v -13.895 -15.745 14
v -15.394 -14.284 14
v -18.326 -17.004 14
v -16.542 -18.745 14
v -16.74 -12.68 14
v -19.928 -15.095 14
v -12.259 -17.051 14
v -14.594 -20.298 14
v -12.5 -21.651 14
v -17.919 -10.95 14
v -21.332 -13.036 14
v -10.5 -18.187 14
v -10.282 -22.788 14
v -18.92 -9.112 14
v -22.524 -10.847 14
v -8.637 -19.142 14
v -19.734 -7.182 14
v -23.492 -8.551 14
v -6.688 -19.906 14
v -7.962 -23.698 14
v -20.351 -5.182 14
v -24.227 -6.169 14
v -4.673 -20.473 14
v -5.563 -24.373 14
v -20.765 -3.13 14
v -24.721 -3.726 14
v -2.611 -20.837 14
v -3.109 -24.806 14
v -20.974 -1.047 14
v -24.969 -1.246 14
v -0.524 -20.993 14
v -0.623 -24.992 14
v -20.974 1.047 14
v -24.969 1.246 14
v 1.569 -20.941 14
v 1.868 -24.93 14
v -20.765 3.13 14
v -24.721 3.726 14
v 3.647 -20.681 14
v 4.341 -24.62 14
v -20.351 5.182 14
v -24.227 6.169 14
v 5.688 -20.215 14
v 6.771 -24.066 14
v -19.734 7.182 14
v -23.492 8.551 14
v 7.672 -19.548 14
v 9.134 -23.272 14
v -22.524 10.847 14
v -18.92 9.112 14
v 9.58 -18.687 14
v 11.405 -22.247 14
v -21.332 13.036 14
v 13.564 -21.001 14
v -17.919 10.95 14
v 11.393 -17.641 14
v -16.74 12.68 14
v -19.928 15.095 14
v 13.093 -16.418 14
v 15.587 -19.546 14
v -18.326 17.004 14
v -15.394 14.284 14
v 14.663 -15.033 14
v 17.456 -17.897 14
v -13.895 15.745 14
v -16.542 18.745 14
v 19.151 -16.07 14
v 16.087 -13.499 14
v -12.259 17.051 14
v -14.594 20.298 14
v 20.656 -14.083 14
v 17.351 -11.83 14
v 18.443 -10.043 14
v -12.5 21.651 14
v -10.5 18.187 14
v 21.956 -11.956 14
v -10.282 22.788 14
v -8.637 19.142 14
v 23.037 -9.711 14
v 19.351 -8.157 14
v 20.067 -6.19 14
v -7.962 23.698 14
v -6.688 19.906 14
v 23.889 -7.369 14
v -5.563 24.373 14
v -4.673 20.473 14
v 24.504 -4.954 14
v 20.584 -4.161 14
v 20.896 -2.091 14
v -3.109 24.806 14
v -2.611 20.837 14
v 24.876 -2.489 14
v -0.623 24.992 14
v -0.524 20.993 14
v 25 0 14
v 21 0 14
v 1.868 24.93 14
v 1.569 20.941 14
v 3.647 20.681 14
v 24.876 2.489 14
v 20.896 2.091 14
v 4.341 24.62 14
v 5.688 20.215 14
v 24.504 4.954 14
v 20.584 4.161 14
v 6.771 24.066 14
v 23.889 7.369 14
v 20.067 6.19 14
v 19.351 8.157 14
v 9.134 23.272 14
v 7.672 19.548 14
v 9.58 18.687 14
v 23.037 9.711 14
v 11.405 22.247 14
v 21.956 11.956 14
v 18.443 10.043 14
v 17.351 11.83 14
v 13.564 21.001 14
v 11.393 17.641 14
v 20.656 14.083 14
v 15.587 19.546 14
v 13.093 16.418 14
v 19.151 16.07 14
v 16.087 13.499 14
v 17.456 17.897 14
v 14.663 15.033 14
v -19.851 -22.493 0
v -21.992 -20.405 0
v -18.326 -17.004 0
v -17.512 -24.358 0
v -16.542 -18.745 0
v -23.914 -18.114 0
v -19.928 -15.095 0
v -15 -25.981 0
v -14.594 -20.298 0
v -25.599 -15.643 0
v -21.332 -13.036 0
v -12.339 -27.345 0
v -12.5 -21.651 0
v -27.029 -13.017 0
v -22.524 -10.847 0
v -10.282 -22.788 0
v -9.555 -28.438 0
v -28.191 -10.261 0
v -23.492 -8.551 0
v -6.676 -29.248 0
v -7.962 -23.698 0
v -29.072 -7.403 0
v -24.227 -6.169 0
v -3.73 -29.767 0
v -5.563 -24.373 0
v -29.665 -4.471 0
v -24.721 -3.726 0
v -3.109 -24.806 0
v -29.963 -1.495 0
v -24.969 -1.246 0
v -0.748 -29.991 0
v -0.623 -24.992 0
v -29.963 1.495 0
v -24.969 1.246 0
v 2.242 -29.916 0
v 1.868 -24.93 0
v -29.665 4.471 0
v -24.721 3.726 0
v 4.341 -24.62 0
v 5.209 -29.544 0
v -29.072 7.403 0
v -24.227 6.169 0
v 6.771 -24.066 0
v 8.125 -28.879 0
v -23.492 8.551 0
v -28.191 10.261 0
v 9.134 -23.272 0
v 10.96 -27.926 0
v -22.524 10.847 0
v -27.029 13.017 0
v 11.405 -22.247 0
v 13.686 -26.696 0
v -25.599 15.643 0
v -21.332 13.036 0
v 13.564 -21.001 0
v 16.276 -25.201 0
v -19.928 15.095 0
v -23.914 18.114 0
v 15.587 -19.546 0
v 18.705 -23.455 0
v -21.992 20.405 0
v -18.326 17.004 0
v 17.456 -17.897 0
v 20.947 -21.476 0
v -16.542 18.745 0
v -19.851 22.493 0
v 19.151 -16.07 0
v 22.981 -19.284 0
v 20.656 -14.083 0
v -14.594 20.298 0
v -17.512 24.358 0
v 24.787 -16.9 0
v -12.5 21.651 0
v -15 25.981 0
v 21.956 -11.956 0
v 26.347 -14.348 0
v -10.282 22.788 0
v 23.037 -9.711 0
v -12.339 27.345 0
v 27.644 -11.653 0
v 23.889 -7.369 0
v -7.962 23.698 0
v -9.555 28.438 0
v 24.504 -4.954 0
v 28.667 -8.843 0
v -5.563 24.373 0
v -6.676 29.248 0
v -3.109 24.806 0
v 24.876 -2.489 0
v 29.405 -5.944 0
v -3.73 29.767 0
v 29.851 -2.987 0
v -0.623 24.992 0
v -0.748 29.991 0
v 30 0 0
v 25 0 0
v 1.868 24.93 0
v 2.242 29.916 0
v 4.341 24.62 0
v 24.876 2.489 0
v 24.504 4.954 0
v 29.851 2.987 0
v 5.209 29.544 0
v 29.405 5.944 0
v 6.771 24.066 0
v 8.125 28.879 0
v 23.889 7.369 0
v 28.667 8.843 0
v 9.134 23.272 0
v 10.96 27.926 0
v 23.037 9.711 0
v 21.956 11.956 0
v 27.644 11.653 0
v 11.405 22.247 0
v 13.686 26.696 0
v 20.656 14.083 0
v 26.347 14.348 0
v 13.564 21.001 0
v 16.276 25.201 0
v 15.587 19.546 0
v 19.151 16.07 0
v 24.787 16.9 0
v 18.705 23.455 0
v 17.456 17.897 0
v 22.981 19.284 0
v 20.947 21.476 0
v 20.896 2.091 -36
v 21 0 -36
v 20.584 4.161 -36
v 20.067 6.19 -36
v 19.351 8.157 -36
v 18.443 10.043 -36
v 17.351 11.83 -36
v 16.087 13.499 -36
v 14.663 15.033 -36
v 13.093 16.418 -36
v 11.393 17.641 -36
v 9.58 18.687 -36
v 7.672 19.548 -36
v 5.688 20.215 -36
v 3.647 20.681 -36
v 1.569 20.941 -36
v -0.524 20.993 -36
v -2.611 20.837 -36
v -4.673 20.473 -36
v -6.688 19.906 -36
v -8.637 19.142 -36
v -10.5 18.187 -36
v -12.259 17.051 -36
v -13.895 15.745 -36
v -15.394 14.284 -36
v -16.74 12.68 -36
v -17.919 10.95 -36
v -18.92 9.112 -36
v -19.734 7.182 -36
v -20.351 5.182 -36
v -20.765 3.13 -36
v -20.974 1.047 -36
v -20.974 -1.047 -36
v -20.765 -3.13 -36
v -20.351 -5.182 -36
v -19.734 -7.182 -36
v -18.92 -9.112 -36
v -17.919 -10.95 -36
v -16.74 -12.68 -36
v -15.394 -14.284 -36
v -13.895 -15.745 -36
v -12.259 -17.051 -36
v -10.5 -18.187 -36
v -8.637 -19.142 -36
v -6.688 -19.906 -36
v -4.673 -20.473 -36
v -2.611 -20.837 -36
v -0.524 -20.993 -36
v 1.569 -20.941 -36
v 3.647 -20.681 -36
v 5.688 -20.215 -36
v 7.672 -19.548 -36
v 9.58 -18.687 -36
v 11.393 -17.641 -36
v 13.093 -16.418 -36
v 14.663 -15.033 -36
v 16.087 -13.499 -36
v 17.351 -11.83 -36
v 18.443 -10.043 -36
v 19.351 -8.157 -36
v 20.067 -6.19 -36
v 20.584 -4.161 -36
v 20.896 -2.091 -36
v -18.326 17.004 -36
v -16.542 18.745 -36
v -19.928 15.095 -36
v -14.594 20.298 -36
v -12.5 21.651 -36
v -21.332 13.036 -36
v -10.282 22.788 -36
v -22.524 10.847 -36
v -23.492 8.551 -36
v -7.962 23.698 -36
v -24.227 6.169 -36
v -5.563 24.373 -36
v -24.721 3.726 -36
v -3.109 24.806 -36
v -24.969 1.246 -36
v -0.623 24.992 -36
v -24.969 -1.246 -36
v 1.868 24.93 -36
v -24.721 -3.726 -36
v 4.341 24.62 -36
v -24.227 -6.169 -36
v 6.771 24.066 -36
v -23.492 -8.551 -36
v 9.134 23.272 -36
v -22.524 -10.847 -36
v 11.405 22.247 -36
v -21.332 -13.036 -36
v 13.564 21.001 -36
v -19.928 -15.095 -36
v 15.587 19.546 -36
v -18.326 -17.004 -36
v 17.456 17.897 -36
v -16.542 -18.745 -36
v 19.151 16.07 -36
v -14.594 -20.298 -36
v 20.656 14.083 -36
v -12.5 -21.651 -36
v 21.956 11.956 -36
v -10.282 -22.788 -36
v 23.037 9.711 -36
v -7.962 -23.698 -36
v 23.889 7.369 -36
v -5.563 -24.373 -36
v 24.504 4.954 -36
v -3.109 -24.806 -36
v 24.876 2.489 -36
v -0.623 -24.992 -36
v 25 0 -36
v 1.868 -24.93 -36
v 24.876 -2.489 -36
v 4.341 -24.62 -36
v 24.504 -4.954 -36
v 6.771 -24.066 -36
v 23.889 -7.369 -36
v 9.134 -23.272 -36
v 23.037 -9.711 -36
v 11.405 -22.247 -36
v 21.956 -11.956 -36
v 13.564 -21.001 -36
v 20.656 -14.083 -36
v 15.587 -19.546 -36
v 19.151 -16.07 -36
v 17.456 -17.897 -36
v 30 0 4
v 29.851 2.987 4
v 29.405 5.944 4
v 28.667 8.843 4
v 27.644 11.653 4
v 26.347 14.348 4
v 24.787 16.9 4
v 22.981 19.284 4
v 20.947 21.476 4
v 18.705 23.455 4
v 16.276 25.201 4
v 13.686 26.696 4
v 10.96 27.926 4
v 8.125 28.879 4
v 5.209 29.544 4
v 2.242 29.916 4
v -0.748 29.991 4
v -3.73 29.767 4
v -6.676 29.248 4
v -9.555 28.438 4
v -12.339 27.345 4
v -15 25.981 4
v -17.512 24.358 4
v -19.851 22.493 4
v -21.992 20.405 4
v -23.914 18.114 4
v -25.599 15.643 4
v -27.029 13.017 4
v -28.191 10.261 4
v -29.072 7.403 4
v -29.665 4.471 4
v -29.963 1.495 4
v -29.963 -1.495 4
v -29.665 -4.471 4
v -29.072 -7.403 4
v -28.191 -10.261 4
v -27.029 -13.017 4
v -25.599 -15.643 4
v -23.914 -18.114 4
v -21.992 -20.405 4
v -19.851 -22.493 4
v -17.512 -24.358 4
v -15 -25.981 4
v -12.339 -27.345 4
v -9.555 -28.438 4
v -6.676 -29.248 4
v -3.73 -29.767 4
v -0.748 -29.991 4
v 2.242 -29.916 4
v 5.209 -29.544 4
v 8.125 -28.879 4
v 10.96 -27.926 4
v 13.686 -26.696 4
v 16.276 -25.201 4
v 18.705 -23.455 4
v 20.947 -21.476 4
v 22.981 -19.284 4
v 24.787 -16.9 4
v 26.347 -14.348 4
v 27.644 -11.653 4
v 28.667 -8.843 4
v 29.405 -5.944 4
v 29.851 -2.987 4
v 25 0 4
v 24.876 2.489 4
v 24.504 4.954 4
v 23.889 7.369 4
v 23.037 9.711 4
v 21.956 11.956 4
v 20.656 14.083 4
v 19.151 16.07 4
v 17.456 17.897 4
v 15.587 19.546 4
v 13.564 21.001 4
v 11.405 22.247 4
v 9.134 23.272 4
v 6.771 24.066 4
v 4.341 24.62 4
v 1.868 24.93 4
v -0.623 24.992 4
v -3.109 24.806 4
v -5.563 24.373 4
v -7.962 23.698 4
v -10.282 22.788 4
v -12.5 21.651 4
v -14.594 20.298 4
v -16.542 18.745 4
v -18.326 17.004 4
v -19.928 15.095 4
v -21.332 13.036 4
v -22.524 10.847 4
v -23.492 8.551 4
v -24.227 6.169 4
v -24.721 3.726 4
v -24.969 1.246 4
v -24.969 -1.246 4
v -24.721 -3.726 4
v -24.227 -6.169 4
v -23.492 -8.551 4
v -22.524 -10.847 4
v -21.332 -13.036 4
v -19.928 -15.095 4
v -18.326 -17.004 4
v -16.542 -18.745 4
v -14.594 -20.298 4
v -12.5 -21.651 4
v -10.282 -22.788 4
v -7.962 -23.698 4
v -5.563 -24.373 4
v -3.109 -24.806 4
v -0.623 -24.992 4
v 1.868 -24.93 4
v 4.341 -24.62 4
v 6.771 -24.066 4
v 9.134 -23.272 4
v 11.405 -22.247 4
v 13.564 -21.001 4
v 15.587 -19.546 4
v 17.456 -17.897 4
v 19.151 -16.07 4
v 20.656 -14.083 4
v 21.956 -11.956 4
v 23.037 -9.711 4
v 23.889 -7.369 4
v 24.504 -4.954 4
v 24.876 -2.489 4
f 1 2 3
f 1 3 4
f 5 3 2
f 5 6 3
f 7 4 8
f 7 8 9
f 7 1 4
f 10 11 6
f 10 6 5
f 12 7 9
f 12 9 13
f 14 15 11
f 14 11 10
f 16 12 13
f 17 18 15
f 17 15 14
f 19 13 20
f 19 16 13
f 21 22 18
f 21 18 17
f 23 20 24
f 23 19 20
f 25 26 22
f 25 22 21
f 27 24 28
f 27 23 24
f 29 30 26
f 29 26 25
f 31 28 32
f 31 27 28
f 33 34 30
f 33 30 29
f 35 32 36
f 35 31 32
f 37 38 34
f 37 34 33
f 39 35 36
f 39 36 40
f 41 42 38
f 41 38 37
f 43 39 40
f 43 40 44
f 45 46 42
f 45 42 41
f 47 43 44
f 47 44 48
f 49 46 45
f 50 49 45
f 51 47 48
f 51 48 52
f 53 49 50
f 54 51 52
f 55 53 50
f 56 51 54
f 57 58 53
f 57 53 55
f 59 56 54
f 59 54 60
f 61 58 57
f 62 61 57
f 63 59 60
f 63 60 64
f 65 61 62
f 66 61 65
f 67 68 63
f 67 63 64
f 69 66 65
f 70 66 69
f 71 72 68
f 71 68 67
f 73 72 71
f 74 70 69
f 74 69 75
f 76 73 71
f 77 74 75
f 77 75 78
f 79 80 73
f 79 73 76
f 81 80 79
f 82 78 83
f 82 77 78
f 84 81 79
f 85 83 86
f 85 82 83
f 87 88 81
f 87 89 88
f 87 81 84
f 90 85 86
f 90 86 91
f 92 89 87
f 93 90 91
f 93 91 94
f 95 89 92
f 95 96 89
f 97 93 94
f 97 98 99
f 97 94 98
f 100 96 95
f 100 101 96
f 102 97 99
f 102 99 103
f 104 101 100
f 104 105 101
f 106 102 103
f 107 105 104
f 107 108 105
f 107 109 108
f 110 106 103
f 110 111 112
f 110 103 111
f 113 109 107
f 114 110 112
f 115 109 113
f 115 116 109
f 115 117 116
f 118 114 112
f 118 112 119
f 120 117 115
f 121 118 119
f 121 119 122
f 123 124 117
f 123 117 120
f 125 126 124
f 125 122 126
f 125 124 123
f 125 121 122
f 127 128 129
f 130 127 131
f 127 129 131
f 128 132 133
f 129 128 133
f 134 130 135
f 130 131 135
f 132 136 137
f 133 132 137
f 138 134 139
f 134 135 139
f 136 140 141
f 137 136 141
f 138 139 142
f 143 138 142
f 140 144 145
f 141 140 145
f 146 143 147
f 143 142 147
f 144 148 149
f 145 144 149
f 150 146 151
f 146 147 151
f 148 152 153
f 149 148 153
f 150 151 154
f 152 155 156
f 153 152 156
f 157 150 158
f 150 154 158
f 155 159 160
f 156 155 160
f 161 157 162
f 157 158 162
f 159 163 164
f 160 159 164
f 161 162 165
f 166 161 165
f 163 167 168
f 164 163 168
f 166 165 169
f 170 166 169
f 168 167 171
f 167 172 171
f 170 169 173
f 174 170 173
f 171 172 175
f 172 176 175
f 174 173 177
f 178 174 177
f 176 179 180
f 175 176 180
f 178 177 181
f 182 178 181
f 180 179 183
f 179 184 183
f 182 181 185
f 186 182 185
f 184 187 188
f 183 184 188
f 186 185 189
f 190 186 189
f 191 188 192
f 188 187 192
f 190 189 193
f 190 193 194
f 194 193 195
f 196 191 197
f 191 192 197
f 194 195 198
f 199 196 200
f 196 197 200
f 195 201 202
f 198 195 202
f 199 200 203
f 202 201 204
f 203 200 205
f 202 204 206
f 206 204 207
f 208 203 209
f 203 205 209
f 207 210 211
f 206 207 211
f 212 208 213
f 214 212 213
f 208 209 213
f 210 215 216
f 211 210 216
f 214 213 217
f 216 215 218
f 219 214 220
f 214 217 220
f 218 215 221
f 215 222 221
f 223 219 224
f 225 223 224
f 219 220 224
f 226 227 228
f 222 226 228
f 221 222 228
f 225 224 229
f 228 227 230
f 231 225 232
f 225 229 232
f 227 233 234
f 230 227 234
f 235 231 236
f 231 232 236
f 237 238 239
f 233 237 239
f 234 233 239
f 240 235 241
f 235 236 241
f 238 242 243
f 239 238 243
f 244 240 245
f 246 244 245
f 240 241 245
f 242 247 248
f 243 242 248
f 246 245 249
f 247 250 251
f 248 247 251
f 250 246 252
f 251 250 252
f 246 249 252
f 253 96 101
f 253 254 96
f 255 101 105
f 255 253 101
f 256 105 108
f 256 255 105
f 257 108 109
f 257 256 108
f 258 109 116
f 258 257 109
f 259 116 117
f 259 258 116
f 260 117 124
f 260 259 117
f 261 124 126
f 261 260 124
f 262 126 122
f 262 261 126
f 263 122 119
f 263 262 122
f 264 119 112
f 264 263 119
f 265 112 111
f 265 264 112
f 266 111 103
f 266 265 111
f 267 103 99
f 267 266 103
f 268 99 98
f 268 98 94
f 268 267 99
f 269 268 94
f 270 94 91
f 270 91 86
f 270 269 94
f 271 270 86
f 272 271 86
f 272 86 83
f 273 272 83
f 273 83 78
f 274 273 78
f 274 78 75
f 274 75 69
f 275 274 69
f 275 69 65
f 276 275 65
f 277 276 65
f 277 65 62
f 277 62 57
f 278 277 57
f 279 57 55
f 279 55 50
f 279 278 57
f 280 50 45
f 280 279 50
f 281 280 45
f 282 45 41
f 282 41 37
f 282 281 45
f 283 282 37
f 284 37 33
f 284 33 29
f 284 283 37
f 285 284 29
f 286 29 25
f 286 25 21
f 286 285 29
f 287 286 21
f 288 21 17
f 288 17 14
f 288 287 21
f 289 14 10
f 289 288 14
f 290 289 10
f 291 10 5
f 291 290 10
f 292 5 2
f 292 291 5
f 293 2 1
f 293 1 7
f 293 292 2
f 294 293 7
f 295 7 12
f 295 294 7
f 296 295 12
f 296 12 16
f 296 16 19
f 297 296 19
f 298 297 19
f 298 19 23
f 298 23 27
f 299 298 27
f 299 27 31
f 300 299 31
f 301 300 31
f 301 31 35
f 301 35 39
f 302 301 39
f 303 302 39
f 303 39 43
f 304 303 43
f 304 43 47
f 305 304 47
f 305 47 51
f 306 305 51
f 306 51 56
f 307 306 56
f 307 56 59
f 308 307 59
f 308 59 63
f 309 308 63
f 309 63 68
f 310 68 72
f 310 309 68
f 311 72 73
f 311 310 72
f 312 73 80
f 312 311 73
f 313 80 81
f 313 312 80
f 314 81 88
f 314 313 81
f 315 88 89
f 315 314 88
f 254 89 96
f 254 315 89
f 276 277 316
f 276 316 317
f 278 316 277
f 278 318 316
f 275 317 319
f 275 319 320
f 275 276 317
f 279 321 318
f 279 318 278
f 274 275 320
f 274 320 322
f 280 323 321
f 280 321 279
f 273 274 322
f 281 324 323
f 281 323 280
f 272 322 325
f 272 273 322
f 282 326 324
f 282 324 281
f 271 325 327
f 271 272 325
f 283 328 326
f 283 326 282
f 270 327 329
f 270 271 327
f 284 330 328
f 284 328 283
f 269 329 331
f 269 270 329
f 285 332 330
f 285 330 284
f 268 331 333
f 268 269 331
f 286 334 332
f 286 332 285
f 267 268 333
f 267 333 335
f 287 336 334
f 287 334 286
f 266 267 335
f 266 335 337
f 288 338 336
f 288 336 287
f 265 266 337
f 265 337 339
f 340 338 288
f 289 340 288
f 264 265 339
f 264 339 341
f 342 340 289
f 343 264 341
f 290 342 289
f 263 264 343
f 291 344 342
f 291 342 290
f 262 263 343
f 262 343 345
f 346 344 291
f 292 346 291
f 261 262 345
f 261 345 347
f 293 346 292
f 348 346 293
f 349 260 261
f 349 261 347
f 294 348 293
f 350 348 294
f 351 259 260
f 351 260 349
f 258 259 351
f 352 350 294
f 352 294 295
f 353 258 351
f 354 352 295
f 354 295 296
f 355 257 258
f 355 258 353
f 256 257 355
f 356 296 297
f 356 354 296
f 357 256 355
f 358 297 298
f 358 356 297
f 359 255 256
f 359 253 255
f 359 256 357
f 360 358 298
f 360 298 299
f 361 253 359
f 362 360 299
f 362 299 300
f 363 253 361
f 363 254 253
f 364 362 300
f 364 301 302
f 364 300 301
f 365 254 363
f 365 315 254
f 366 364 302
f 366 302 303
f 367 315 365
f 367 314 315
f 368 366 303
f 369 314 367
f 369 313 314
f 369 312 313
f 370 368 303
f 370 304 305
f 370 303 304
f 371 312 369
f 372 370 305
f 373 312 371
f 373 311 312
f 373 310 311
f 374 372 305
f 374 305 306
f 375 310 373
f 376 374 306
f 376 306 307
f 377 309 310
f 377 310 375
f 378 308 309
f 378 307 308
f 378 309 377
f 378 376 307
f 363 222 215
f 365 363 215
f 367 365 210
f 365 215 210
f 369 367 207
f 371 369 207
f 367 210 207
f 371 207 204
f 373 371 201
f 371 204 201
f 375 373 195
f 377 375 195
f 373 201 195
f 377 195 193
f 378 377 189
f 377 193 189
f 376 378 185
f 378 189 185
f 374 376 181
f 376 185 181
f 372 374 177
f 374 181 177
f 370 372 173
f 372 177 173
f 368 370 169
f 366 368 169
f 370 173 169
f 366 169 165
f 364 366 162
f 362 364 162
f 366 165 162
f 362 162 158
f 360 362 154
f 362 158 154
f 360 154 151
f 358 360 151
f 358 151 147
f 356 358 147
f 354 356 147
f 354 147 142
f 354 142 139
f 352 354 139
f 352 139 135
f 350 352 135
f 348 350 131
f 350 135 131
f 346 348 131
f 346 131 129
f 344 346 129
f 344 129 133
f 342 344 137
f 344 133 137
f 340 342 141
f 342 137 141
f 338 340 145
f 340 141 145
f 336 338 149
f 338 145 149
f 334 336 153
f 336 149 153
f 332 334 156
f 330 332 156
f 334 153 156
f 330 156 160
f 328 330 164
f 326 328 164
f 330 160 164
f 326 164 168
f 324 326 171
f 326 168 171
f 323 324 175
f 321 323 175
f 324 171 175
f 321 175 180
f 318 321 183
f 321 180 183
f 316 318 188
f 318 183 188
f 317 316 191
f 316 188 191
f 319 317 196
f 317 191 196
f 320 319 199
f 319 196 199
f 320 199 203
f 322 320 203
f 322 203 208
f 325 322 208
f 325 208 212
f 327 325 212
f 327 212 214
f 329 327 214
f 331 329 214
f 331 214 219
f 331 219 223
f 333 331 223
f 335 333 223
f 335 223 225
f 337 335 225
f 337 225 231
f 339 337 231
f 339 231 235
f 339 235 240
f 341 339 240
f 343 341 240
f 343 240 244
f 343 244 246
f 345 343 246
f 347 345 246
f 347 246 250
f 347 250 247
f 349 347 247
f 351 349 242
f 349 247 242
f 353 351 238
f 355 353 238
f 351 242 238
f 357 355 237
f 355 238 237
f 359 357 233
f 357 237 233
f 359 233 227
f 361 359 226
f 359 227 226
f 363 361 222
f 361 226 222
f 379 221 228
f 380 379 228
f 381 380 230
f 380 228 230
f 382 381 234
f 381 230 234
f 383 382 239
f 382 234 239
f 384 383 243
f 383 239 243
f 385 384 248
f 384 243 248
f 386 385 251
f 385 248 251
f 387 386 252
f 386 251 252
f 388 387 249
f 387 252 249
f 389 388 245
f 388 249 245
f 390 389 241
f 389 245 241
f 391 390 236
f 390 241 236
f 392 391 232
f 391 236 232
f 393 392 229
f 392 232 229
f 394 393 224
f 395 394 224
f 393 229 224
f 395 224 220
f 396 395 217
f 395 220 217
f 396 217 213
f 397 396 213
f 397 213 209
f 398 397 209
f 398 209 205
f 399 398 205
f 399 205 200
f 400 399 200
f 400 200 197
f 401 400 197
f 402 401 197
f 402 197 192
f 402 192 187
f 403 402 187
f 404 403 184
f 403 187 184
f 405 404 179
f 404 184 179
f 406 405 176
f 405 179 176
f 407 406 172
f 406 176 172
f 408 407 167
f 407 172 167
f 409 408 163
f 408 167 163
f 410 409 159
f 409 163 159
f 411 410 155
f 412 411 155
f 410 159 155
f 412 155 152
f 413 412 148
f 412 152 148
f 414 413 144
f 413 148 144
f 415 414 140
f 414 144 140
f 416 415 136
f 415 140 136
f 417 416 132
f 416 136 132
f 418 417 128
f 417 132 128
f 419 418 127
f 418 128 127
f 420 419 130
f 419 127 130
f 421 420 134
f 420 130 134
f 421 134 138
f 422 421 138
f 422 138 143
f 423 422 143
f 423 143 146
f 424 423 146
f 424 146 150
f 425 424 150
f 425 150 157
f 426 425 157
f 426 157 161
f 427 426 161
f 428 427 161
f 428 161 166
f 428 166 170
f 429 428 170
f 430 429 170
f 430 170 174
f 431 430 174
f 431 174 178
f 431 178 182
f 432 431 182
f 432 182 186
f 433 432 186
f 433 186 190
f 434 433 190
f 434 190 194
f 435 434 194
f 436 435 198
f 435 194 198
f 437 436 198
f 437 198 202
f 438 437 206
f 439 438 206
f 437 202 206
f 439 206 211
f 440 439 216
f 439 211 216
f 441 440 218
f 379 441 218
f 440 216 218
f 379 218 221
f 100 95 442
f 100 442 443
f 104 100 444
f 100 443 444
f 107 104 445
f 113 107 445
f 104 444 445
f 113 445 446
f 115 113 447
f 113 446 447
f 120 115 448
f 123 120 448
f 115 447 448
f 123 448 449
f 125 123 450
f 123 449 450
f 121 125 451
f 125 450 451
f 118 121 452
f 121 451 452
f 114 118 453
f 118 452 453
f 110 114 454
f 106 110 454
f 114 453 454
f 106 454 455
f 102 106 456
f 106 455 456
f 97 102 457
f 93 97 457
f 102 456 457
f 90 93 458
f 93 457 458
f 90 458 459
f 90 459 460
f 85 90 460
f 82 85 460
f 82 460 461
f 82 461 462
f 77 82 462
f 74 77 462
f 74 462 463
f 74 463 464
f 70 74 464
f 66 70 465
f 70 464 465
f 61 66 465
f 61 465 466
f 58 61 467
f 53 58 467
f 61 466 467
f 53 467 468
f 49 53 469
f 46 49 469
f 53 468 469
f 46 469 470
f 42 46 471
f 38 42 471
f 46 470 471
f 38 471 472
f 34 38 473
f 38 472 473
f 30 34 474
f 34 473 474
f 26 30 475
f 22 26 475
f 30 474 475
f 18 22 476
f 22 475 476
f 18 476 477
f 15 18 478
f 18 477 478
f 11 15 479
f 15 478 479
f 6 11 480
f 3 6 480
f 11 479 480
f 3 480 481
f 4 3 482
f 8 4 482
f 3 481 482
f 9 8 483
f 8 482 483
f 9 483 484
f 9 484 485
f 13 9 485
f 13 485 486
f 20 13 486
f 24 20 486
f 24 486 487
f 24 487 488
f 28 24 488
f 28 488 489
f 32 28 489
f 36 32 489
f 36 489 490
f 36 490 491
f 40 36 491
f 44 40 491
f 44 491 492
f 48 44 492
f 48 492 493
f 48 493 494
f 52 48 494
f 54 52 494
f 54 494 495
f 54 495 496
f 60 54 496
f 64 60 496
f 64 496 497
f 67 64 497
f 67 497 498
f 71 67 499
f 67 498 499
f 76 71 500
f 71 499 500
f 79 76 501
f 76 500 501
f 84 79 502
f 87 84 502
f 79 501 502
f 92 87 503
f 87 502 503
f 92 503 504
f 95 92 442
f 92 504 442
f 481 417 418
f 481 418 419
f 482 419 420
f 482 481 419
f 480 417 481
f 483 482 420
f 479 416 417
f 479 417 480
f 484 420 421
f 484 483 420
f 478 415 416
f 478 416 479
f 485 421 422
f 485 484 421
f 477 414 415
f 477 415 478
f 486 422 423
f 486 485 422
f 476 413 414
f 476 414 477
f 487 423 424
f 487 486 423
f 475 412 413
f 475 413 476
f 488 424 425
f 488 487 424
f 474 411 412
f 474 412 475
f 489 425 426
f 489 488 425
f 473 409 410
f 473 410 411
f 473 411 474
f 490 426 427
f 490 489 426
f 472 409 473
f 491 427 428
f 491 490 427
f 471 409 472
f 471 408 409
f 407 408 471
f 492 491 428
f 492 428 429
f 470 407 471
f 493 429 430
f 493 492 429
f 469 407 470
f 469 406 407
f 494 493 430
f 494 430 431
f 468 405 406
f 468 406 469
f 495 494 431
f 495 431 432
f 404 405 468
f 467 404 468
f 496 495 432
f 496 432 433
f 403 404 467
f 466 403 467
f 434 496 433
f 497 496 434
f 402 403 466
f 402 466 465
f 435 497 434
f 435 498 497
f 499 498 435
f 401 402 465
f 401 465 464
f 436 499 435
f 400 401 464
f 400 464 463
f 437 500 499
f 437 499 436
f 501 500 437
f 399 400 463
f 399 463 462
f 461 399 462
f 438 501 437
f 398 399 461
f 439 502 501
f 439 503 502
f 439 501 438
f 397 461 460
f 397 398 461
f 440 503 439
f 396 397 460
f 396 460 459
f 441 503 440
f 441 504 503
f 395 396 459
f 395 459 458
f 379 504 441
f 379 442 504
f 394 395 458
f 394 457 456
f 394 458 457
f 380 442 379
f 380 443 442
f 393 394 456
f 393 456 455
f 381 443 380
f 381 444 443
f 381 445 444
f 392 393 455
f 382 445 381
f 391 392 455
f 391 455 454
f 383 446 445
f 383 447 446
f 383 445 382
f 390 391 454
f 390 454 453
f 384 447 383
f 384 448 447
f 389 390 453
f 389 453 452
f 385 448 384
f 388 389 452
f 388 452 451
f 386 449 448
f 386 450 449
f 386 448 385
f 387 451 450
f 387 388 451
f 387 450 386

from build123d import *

# Parameters (mm, degrees)
SKETCH_R      = 30
SKETCH_R_2    = 21
PAD_DEPTH     = 4
SKETCH001_R   = 25
SKETCH001_R_2 = 21
PAD001_DEPTH  = 36
SKETCH002_R   = 25
SKETCH002_R_2 = 21
PAD002_DEPTH  = 10


with BuildPart() as part:
    # Sketch → Pad (new body)
    with BuildSketch(Plane.XY):
        Circle(SKETCH_R)
        Circle(SKETCH_R_2, mode=Mode.SUBTRACT)
    extrude(amount=PAD_DEPTH)

    # Sketch001 (on Face3 of Pad) → Pad001 (join)
    with BuildSketch(Plane(origin=(0, 0, 0), x_dir=(1, 0, 0), z_dir=(0, 0, -1))):
        Circle(SKETCH001_R)
        Circle(SKETCH001_R_2, mode=Mode.SUBTRACT)
    extrude(amount=PAD001_DEPTH)

    # Sketch002 (on Face3 of Pad001) → Pad002 (join)
    with BuildSketch(Plane.XY.offset(4)):
        Circle(SKETCH002_R)
        Circle(SKETCH002_R_2, mode=Mode.SUBTRACT)
    extrude(amount=PAD002_DEPTH)


solid = part.part
